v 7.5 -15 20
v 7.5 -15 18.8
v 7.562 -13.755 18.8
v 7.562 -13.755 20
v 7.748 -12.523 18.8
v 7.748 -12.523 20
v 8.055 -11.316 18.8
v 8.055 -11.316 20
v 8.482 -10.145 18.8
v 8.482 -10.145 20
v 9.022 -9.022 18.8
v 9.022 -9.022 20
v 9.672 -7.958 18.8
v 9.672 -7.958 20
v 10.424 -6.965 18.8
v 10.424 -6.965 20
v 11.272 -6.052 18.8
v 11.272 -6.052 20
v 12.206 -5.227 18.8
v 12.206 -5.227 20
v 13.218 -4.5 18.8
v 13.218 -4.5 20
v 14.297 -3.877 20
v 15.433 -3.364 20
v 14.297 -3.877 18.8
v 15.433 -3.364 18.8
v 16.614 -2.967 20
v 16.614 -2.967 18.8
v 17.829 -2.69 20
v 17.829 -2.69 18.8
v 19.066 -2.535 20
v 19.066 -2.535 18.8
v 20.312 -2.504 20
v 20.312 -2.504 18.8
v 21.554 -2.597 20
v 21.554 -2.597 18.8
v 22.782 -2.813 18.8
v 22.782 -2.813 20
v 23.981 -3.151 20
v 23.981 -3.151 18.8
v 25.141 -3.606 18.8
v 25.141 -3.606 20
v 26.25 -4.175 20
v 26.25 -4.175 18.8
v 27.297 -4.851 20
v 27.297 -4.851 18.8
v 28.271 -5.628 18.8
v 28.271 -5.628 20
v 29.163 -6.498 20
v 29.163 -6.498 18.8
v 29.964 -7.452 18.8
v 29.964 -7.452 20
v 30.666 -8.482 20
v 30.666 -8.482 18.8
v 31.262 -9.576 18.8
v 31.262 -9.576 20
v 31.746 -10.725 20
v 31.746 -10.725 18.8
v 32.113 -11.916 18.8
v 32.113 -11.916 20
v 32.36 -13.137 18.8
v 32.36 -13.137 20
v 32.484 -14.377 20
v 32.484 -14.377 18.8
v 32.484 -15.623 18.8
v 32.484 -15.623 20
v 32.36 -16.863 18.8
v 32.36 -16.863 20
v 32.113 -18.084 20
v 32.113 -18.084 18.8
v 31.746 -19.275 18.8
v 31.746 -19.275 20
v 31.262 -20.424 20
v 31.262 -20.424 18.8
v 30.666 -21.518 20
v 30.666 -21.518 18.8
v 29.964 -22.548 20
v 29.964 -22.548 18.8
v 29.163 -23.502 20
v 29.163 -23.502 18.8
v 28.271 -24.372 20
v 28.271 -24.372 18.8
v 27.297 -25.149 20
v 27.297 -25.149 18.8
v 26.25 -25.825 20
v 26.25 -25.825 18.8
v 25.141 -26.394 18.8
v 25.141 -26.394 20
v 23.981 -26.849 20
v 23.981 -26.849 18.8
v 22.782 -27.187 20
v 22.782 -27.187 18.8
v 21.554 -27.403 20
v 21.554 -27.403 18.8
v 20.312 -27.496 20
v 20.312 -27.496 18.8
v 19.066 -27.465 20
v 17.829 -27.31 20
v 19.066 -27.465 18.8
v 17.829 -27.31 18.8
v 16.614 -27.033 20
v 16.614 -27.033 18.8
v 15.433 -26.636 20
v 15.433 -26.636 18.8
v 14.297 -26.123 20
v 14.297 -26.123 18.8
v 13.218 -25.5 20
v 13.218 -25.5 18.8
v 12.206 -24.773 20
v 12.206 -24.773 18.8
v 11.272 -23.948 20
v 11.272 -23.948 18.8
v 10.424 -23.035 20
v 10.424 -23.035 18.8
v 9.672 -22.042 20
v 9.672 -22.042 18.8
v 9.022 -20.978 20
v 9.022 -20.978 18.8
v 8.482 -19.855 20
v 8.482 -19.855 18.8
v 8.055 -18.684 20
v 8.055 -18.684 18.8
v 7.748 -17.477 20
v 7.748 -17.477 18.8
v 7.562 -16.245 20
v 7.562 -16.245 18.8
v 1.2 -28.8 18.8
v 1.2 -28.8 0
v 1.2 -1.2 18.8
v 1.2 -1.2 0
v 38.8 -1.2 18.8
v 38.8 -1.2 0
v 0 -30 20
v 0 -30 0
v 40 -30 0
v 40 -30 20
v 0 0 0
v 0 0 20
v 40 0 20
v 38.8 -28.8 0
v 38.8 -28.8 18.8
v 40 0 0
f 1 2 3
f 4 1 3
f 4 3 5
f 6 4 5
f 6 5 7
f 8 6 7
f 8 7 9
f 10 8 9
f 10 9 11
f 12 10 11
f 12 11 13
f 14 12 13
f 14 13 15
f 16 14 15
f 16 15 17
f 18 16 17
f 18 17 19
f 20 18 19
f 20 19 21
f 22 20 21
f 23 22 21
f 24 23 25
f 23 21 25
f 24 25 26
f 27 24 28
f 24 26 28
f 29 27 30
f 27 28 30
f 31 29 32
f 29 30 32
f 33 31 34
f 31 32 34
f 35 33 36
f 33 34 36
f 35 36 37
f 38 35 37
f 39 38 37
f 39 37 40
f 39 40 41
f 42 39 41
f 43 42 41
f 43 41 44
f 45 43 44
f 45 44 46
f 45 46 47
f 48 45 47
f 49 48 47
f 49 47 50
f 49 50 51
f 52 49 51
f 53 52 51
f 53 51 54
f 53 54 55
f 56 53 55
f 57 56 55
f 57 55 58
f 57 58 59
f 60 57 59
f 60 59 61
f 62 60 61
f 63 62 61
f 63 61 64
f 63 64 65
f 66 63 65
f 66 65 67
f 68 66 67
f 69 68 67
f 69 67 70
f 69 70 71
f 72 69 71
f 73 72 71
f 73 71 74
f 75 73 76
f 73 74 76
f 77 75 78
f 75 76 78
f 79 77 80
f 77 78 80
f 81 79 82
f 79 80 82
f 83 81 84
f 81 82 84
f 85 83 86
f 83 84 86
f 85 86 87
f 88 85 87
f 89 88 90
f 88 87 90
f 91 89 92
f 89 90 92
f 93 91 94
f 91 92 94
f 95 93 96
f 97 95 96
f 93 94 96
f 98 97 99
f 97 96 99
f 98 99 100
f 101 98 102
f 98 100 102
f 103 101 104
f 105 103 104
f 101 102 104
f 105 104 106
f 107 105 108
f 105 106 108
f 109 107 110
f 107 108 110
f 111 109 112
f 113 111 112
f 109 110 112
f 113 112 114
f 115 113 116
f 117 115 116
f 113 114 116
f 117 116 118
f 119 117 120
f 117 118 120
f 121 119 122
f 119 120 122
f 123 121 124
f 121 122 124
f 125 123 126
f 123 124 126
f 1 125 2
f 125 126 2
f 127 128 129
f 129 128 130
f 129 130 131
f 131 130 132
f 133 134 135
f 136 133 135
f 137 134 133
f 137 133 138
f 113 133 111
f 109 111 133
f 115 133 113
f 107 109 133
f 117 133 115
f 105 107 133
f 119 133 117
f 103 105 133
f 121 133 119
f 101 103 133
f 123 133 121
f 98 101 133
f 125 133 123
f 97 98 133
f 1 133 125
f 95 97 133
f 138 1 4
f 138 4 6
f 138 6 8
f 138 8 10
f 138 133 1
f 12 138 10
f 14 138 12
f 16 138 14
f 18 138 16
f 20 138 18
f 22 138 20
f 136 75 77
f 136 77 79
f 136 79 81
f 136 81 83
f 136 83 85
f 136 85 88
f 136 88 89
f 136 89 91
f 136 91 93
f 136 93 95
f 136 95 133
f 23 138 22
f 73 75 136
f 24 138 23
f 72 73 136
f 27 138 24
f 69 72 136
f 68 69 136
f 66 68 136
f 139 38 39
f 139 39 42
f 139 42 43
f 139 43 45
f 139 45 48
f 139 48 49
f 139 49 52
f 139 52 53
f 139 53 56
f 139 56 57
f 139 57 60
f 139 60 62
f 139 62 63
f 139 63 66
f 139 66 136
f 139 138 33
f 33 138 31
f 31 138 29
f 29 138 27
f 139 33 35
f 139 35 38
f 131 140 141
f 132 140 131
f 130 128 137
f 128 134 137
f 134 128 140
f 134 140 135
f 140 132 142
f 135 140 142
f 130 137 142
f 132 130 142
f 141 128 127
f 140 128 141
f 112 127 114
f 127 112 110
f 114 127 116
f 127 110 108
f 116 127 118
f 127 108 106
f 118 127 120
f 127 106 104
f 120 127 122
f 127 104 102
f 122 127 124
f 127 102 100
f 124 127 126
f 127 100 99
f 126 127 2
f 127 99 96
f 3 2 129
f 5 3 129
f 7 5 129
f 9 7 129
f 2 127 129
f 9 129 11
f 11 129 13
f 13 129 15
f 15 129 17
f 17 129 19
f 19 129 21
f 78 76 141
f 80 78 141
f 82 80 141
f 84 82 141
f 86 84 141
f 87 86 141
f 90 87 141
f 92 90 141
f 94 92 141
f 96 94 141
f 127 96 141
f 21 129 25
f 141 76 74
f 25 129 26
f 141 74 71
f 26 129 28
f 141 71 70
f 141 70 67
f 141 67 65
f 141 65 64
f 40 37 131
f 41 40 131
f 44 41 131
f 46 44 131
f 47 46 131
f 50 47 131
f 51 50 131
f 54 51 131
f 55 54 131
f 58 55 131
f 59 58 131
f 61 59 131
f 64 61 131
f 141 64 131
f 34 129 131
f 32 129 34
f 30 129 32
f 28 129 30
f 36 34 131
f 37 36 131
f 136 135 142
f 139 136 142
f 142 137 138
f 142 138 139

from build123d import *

# Parameters (mm, degrees)
F0_W     = 40
F0_H     = 30
F1_DEPTH = 20
F2_T     = -1.2
F4_D     = 25


with BuildPart() as f1:
    # F0 (on Top) → F1 (new body)
    with BuildSketch(Plane.XY):
        with Locations((20, -15)):
            Rectangle(F0_W, F0_H)
    extrude(amount=F1_DEPTH)

    # F2
    f2_openings = [f1.faces().sort_by_distance(p)[0] for p in [
        (20, -15, 0),
    ]]
    offset(amount=F2_T, openings=f2_openings)

    # F4 (through all)
    with Locations(Plane.XY.offset(20)):
        with Locations((20, -15)):
            Hole(F4_D / 2)


solid = f1.part
